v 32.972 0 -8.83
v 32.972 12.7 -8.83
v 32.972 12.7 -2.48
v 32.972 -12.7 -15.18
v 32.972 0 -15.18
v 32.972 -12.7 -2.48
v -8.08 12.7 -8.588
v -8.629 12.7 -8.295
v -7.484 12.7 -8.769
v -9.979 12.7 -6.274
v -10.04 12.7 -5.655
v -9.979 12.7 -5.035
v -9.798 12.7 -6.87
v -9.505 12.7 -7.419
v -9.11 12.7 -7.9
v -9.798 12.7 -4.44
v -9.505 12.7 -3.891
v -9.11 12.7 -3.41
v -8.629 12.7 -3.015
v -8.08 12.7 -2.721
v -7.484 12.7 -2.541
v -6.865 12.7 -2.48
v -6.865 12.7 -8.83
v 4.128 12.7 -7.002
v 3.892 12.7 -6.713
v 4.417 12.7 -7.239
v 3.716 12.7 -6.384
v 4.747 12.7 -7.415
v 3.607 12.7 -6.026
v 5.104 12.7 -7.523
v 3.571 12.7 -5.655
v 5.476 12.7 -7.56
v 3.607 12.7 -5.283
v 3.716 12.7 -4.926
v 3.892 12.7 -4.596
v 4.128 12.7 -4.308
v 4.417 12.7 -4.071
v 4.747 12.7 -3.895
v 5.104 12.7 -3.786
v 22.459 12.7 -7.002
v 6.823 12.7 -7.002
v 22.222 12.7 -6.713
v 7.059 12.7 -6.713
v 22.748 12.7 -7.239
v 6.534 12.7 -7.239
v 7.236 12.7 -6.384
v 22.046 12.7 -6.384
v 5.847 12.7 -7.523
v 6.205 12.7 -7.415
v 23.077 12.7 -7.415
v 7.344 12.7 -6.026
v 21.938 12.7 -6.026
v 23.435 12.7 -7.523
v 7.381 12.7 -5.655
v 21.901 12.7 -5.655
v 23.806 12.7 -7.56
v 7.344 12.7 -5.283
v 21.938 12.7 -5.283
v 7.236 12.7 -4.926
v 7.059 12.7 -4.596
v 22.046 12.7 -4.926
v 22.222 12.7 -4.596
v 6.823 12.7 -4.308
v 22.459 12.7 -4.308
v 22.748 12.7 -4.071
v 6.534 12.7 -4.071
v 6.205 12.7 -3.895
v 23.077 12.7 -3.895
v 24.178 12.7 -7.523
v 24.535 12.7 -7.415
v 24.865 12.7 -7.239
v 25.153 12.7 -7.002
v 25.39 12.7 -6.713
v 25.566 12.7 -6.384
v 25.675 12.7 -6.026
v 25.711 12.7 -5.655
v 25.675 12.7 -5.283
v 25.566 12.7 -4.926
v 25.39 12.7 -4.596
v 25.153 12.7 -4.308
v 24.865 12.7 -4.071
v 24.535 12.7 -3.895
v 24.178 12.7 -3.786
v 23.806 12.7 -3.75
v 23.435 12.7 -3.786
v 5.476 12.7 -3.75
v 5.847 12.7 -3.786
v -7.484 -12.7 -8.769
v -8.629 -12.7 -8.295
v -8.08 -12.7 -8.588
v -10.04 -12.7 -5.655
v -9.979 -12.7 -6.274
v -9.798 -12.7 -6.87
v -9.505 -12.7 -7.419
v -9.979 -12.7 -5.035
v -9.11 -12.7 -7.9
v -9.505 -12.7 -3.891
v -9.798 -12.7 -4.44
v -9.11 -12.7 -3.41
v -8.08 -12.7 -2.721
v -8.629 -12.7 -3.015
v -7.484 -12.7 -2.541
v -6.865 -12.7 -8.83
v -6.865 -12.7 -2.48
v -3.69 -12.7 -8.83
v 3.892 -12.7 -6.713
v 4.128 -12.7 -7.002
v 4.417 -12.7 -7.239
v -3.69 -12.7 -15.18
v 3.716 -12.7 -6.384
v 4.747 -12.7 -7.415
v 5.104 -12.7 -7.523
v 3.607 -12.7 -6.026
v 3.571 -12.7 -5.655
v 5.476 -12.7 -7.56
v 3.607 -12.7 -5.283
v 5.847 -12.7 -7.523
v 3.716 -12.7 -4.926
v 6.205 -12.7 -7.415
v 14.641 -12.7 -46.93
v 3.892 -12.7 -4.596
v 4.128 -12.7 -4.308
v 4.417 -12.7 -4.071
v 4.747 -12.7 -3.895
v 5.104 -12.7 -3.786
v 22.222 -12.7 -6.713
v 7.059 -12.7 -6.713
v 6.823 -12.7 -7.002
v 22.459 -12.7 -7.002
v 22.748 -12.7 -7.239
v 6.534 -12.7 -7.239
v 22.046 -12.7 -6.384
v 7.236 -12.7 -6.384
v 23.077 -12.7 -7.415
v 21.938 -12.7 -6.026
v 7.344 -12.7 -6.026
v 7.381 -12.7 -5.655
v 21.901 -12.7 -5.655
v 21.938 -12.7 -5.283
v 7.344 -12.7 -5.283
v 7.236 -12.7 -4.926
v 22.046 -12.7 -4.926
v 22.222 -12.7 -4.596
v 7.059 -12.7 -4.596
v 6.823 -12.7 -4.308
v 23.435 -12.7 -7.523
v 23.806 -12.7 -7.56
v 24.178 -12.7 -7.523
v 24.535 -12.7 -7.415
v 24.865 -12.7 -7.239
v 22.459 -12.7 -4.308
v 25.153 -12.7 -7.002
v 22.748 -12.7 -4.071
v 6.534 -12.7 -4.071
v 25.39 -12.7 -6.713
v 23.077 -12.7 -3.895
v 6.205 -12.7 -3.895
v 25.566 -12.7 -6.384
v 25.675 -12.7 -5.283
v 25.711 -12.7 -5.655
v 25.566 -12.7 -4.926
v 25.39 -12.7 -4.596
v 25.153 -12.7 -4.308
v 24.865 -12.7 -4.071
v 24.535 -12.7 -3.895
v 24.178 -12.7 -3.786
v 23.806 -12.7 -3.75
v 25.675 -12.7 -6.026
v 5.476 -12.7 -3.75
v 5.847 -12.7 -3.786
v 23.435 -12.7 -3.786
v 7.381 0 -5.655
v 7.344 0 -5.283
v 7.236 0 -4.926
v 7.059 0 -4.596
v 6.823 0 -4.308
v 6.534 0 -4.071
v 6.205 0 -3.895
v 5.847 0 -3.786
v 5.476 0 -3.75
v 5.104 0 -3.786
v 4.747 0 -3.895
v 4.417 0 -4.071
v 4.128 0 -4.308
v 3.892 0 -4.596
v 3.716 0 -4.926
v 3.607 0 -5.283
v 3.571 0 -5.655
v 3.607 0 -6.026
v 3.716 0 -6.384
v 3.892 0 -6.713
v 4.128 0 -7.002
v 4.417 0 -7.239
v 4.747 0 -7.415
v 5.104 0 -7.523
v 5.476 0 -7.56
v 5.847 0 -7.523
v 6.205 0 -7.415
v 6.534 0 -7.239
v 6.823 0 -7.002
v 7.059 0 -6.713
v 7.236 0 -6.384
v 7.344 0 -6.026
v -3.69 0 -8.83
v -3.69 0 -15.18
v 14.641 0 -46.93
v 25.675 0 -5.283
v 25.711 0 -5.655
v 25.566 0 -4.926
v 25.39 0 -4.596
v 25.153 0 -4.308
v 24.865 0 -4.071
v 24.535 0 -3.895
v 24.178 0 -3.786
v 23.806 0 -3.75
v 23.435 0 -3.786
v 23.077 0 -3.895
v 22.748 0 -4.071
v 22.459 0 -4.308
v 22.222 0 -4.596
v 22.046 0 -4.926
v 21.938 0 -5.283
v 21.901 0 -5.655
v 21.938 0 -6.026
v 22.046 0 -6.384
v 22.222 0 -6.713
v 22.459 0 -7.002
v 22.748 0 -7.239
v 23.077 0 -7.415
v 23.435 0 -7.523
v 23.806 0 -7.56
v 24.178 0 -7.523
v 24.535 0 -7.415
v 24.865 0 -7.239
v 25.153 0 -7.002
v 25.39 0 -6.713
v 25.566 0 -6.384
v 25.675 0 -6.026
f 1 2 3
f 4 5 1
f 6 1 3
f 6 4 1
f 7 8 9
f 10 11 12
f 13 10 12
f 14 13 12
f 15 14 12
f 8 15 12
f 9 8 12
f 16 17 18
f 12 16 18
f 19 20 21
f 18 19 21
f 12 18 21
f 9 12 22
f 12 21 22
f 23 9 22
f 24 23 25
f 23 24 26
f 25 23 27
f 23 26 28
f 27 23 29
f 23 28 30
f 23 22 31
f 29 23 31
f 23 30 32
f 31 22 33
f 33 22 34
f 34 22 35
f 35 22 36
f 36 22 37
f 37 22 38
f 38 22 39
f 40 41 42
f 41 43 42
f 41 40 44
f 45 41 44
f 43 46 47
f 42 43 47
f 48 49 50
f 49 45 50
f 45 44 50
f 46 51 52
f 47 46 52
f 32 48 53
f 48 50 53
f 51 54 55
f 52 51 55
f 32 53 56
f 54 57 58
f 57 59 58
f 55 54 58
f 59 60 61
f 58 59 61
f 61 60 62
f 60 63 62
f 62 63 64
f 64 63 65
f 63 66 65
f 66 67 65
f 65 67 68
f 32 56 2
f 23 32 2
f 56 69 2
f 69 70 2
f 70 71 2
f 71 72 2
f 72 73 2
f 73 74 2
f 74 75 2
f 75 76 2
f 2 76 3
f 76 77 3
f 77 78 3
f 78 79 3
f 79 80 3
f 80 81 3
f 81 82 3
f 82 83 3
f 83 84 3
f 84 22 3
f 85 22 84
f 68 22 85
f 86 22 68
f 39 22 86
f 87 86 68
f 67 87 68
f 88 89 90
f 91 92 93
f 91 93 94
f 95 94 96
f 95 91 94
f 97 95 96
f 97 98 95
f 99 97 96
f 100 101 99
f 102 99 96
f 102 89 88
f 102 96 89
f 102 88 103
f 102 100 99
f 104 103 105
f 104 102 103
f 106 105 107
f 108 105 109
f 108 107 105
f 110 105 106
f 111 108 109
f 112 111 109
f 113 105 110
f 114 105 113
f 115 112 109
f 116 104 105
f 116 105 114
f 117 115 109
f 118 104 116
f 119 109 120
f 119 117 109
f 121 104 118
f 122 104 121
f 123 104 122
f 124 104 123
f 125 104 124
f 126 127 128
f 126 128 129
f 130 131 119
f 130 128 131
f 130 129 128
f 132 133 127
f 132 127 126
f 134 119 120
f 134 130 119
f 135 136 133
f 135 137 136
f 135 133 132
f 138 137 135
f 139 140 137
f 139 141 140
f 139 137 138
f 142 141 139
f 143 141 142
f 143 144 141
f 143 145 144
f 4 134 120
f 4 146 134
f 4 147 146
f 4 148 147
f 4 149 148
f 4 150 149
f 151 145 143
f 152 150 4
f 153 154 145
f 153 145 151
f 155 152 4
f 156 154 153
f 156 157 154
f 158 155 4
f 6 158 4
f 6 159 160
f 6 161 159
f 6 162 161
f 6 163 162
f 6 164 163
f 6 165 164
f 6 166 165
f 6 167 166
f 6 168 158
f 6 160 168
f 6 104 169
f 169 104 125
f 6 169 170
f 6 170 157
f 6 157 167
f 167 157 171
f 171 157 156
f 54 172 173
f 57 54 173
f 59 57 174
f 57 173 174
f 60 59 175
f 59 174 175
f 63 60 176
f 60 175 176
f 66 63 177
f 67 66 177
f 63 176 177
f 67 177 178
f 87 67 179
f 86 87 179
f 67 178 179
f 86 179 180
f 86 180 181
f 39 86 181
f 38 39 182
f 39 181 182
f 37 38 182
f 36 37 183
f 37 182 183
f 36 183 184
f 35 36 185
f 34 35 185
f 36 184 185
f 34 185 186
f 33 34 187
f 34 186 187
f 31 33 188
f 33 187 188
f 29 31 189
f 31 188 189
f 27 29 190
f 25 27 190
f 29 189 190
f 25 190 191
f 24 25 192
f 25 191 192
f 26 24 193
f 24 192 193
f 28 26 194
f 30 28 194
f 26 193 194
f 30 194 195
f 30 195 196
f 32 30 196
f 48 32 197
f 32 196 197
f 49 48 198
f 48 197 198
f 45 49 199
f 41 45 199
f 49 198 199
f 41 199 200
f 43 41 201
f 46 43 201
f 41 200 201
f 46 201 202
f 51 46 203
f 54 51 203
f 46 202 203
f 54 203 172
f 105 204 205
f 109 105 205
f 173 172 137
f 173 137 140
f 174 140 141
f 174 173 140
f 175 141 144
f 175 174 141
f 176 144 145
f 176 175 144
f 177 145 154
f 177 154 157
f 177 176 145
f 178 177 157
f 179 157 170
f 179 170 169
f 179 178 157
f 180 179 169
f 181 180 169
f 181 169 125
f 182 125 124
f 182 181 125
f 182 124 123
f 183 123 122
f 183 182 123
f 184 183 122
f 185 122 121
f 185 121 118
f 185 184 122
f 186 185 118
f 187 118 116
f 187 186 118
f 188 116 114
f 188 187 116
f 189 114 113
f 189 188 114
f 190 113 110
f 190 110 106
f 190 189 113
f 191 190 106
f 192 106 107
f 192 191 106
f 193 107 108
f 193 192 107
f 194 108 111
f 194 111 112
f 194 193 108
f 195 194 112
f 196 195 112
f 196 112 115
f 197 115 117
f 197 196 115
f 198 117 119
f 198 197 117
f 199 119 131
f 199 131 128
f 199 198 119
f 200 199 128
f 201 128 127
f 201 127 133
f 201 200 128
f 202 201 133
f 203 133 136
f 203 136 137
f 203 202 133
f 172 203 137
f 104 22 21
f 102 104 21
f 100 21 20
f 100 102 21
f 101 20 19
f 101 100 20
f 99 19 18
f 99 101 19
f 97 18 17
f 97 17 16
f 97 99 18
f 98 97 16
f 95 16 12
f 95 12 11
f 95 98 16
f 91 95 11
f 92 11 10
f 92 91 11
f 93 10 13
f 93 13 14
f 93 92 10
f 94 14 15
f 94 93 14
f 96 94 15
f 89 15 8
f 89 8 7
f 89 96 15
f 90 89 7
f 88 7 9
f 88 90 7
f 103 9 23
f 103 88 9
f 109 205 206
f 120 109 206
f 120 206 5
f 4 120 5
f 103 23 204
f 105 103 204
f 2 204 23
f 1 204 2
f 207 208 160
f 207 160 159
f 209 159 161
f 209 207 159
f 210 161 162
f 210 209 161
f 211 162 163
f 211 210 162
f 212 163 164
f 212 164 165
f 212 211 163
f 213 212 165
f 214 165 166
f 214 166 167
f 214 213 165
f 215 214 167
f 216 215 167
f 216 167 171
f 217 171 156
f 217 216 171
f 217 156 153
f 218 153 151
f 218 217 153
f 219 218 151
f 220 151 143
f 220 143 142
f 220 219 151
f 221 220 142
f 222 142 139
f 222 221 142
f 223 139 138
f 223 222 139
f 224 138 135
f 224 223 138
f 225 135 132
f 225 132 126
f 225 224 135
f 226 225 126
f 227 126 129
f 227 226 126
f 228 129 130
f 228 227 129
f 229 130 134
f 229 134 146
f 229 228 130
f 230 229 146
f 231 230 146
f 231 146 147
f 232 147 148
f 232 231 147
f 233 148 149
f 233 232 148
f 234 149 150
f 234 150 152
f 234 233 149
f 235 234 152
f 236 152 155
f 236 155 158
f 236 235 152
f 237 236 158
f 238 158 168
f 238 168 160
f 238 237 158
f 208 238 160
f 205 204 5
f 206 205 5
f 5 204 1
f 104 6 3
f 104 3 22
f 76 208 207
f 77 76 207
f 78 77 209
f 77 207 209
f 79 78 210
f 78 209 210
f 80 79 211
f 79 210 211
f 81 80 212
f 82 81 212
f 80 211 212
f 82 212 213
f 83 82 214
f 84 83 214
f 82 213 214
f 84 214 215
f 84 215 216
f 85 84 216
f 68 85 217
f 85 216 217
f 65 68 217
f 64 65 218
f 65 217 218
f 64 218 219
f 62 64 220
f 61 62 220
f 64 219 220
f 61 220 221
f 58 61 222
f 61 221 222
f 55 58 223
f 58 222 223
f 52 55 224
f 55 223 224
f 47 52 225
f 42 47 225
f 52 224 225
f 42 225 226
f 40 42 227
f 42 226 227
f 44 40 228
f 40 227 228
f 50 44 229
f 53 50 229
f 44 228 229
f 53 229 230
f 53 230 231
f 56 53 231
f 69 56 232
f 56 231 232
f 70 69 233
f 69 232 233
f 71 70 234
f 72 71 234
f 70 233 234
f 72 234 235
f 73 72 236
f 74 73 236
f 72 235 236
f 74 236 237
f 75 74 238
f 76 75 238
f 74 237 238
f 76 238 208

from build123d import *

# Parameters (mm, degrees)
F0_R     = 1.905
F1_DEPTH = 12.7
F2_DEPTH = 12.7
F3_DEPTH = 12.7


with BuildPart() as f1:
    # F0 (on Front) → F1 (new body)
    with BuildSketch(Plane.XZ):
        Polygon((-3.6898989651, -8.8297099552), (32.9718431285, -8.8297099552), (32.9718431285, -2.4797099552), (-3.6898989651, -2.4797099552), (-3.6898989651, -5.6547099552), align=None)
        with Locations((5.4755365583, -5.6547099552)):
            Circle(F0_R, mode=Mode.SUBTRACT)
        with Locations((23.8064076051, -5.6547099552)):
            Circle(F0_R, mode=Mode.SUBTRACT)
        Polygon((14.6409720817, -46.9297099552), (32.9718431285, -15.1797099552), (32.9718431285, -8.8297099552), (-3.6898989651, -8.8297099552), (-3.6898989651, -15.1797099552), align=None)
        with BuildLine():
            ThreePointArc((-6.8648989651, -8.8297099552), (-4.6198349348, -7.8997739855), (-3.6898989651, -5.6547099552))
            ThreePointArc((-3.6898989651, -5.6547099552), (-4.6198349348, -3.409645925), (-6.8648989651, -2.4797099552))
            ThreePointArc((-6.8648989651, -2.4797099552), (-10.0398989651, -5.6547099552), (-6.8648989651, -8.8297099552))
        make_face()
        with Locations((-6.8648989651, -5.6547099552)):
            Circle(F0_R, mode=Mode.SUBTRACT)
        with BuildLine():
            Line((-3.6898989651, -5.6547099552), (-3.6898989651, -2.4797099552))
            Line((-3.6898989651, -2.4797099552), (-6.8648989651, -2.4797099552))
            ThreePointArc((-6.8648989651, -2.4797099552), (-4.6198349348, -3.409645925), (-3.6898989651, -5.6547099552))
        make_face()
        with BuildLine():
            Line((-6.8648989651, -8.8297099552), (-3.6898989651, -8.8297099552))
            Line((-3.6898989651, -8.8297099552), (-3.6898989651, -5.6547099552))
            ThreePointArc((-3.6898989651, -5.6547099552), (-4.6198349348, -7.8997739855), (-6.8648989651, -8.8297099552))
        make_face()
        with Locations((-6.8648989651, -5.6547099552)):
            Circle(F0_R)
    extrude(amount=F1_DEPTH)

    # F0 (on Front) → F2 (join)
    with BuildSketch(Plane.XZ):
        Polygon((-3.6898989651, -8.8297099552), (32.9718431285, -8.8297099552), (32.9718431285, -2.4797099552), (-3.6898989651, -2.4797099552), (-3.6898989651, -5.6547099552), align=None)
        with Locations((5.4755365583, -5.6547099552)):
            Circle(F0_R, mode=Mode.SUBTRACT)
        with Locations((23.8064076051, -5.6547099552)):
            Circle(F0_R, mode=Mode.SUBTRACT)
        with BuildLine():
            ThreePointArc((-6.8648989651, -8.8297099552), (-4.6198349348, -7.8997739855), (-3.6898989651, -5.6547099552))
            ThreePointArc((-3.6898989651, -5.6547099552), (-4.6198349348, -3.409645925), (-6.8648989651, -2.4797099552))
            ThreePointArc((-6.8648989651, -2.4797099552), (-10.0398989651, -5.6547099552), (-6.8648989651, -8.8297099552))
        make_face()
        with Locations((-6.8648989651, -5.6547099552)):
            Circle(F0_R, mode=Mode.SUBTRACT)
        with BuildLine():
            Line((-3.6898989651, -5.6547099552), (-3.6898989651, -2.4797099552))
            Line((-3.6898989651, -2.4797099552), (-6.8648989651, -2.4797099552))
            ThreePointArc((-6.8648989651, -2.4797099552), (-4.6198349348, -3.409645925), (-3.6898989651, -5.6547099552))
        make_face()
        with BuildLine():
            Line((-6.8648989651, -8.8297099552), (-3.6898989651, -8.8297099552))
            Line((-3.6898989651, -8.8297099552), (-3.6898989651, -5.6547099552))
            ThreePointArc((-3.6898989651, -5.6547099552), (-4.6198349348, -7.8997739855), (-6.8648989651, -8.8297099552))
        make_face()
    extrude(amount=-F2_DEPTH)

    # F0 (on Front) → F3 (join)
    with BuildSketch(Plane.XZ):
        with Locations((-6.8648989651, -5.6547099552)):
            Circle(F0_R)
    extrude(amount=-F3_DEPTH)


solid = f1.part
